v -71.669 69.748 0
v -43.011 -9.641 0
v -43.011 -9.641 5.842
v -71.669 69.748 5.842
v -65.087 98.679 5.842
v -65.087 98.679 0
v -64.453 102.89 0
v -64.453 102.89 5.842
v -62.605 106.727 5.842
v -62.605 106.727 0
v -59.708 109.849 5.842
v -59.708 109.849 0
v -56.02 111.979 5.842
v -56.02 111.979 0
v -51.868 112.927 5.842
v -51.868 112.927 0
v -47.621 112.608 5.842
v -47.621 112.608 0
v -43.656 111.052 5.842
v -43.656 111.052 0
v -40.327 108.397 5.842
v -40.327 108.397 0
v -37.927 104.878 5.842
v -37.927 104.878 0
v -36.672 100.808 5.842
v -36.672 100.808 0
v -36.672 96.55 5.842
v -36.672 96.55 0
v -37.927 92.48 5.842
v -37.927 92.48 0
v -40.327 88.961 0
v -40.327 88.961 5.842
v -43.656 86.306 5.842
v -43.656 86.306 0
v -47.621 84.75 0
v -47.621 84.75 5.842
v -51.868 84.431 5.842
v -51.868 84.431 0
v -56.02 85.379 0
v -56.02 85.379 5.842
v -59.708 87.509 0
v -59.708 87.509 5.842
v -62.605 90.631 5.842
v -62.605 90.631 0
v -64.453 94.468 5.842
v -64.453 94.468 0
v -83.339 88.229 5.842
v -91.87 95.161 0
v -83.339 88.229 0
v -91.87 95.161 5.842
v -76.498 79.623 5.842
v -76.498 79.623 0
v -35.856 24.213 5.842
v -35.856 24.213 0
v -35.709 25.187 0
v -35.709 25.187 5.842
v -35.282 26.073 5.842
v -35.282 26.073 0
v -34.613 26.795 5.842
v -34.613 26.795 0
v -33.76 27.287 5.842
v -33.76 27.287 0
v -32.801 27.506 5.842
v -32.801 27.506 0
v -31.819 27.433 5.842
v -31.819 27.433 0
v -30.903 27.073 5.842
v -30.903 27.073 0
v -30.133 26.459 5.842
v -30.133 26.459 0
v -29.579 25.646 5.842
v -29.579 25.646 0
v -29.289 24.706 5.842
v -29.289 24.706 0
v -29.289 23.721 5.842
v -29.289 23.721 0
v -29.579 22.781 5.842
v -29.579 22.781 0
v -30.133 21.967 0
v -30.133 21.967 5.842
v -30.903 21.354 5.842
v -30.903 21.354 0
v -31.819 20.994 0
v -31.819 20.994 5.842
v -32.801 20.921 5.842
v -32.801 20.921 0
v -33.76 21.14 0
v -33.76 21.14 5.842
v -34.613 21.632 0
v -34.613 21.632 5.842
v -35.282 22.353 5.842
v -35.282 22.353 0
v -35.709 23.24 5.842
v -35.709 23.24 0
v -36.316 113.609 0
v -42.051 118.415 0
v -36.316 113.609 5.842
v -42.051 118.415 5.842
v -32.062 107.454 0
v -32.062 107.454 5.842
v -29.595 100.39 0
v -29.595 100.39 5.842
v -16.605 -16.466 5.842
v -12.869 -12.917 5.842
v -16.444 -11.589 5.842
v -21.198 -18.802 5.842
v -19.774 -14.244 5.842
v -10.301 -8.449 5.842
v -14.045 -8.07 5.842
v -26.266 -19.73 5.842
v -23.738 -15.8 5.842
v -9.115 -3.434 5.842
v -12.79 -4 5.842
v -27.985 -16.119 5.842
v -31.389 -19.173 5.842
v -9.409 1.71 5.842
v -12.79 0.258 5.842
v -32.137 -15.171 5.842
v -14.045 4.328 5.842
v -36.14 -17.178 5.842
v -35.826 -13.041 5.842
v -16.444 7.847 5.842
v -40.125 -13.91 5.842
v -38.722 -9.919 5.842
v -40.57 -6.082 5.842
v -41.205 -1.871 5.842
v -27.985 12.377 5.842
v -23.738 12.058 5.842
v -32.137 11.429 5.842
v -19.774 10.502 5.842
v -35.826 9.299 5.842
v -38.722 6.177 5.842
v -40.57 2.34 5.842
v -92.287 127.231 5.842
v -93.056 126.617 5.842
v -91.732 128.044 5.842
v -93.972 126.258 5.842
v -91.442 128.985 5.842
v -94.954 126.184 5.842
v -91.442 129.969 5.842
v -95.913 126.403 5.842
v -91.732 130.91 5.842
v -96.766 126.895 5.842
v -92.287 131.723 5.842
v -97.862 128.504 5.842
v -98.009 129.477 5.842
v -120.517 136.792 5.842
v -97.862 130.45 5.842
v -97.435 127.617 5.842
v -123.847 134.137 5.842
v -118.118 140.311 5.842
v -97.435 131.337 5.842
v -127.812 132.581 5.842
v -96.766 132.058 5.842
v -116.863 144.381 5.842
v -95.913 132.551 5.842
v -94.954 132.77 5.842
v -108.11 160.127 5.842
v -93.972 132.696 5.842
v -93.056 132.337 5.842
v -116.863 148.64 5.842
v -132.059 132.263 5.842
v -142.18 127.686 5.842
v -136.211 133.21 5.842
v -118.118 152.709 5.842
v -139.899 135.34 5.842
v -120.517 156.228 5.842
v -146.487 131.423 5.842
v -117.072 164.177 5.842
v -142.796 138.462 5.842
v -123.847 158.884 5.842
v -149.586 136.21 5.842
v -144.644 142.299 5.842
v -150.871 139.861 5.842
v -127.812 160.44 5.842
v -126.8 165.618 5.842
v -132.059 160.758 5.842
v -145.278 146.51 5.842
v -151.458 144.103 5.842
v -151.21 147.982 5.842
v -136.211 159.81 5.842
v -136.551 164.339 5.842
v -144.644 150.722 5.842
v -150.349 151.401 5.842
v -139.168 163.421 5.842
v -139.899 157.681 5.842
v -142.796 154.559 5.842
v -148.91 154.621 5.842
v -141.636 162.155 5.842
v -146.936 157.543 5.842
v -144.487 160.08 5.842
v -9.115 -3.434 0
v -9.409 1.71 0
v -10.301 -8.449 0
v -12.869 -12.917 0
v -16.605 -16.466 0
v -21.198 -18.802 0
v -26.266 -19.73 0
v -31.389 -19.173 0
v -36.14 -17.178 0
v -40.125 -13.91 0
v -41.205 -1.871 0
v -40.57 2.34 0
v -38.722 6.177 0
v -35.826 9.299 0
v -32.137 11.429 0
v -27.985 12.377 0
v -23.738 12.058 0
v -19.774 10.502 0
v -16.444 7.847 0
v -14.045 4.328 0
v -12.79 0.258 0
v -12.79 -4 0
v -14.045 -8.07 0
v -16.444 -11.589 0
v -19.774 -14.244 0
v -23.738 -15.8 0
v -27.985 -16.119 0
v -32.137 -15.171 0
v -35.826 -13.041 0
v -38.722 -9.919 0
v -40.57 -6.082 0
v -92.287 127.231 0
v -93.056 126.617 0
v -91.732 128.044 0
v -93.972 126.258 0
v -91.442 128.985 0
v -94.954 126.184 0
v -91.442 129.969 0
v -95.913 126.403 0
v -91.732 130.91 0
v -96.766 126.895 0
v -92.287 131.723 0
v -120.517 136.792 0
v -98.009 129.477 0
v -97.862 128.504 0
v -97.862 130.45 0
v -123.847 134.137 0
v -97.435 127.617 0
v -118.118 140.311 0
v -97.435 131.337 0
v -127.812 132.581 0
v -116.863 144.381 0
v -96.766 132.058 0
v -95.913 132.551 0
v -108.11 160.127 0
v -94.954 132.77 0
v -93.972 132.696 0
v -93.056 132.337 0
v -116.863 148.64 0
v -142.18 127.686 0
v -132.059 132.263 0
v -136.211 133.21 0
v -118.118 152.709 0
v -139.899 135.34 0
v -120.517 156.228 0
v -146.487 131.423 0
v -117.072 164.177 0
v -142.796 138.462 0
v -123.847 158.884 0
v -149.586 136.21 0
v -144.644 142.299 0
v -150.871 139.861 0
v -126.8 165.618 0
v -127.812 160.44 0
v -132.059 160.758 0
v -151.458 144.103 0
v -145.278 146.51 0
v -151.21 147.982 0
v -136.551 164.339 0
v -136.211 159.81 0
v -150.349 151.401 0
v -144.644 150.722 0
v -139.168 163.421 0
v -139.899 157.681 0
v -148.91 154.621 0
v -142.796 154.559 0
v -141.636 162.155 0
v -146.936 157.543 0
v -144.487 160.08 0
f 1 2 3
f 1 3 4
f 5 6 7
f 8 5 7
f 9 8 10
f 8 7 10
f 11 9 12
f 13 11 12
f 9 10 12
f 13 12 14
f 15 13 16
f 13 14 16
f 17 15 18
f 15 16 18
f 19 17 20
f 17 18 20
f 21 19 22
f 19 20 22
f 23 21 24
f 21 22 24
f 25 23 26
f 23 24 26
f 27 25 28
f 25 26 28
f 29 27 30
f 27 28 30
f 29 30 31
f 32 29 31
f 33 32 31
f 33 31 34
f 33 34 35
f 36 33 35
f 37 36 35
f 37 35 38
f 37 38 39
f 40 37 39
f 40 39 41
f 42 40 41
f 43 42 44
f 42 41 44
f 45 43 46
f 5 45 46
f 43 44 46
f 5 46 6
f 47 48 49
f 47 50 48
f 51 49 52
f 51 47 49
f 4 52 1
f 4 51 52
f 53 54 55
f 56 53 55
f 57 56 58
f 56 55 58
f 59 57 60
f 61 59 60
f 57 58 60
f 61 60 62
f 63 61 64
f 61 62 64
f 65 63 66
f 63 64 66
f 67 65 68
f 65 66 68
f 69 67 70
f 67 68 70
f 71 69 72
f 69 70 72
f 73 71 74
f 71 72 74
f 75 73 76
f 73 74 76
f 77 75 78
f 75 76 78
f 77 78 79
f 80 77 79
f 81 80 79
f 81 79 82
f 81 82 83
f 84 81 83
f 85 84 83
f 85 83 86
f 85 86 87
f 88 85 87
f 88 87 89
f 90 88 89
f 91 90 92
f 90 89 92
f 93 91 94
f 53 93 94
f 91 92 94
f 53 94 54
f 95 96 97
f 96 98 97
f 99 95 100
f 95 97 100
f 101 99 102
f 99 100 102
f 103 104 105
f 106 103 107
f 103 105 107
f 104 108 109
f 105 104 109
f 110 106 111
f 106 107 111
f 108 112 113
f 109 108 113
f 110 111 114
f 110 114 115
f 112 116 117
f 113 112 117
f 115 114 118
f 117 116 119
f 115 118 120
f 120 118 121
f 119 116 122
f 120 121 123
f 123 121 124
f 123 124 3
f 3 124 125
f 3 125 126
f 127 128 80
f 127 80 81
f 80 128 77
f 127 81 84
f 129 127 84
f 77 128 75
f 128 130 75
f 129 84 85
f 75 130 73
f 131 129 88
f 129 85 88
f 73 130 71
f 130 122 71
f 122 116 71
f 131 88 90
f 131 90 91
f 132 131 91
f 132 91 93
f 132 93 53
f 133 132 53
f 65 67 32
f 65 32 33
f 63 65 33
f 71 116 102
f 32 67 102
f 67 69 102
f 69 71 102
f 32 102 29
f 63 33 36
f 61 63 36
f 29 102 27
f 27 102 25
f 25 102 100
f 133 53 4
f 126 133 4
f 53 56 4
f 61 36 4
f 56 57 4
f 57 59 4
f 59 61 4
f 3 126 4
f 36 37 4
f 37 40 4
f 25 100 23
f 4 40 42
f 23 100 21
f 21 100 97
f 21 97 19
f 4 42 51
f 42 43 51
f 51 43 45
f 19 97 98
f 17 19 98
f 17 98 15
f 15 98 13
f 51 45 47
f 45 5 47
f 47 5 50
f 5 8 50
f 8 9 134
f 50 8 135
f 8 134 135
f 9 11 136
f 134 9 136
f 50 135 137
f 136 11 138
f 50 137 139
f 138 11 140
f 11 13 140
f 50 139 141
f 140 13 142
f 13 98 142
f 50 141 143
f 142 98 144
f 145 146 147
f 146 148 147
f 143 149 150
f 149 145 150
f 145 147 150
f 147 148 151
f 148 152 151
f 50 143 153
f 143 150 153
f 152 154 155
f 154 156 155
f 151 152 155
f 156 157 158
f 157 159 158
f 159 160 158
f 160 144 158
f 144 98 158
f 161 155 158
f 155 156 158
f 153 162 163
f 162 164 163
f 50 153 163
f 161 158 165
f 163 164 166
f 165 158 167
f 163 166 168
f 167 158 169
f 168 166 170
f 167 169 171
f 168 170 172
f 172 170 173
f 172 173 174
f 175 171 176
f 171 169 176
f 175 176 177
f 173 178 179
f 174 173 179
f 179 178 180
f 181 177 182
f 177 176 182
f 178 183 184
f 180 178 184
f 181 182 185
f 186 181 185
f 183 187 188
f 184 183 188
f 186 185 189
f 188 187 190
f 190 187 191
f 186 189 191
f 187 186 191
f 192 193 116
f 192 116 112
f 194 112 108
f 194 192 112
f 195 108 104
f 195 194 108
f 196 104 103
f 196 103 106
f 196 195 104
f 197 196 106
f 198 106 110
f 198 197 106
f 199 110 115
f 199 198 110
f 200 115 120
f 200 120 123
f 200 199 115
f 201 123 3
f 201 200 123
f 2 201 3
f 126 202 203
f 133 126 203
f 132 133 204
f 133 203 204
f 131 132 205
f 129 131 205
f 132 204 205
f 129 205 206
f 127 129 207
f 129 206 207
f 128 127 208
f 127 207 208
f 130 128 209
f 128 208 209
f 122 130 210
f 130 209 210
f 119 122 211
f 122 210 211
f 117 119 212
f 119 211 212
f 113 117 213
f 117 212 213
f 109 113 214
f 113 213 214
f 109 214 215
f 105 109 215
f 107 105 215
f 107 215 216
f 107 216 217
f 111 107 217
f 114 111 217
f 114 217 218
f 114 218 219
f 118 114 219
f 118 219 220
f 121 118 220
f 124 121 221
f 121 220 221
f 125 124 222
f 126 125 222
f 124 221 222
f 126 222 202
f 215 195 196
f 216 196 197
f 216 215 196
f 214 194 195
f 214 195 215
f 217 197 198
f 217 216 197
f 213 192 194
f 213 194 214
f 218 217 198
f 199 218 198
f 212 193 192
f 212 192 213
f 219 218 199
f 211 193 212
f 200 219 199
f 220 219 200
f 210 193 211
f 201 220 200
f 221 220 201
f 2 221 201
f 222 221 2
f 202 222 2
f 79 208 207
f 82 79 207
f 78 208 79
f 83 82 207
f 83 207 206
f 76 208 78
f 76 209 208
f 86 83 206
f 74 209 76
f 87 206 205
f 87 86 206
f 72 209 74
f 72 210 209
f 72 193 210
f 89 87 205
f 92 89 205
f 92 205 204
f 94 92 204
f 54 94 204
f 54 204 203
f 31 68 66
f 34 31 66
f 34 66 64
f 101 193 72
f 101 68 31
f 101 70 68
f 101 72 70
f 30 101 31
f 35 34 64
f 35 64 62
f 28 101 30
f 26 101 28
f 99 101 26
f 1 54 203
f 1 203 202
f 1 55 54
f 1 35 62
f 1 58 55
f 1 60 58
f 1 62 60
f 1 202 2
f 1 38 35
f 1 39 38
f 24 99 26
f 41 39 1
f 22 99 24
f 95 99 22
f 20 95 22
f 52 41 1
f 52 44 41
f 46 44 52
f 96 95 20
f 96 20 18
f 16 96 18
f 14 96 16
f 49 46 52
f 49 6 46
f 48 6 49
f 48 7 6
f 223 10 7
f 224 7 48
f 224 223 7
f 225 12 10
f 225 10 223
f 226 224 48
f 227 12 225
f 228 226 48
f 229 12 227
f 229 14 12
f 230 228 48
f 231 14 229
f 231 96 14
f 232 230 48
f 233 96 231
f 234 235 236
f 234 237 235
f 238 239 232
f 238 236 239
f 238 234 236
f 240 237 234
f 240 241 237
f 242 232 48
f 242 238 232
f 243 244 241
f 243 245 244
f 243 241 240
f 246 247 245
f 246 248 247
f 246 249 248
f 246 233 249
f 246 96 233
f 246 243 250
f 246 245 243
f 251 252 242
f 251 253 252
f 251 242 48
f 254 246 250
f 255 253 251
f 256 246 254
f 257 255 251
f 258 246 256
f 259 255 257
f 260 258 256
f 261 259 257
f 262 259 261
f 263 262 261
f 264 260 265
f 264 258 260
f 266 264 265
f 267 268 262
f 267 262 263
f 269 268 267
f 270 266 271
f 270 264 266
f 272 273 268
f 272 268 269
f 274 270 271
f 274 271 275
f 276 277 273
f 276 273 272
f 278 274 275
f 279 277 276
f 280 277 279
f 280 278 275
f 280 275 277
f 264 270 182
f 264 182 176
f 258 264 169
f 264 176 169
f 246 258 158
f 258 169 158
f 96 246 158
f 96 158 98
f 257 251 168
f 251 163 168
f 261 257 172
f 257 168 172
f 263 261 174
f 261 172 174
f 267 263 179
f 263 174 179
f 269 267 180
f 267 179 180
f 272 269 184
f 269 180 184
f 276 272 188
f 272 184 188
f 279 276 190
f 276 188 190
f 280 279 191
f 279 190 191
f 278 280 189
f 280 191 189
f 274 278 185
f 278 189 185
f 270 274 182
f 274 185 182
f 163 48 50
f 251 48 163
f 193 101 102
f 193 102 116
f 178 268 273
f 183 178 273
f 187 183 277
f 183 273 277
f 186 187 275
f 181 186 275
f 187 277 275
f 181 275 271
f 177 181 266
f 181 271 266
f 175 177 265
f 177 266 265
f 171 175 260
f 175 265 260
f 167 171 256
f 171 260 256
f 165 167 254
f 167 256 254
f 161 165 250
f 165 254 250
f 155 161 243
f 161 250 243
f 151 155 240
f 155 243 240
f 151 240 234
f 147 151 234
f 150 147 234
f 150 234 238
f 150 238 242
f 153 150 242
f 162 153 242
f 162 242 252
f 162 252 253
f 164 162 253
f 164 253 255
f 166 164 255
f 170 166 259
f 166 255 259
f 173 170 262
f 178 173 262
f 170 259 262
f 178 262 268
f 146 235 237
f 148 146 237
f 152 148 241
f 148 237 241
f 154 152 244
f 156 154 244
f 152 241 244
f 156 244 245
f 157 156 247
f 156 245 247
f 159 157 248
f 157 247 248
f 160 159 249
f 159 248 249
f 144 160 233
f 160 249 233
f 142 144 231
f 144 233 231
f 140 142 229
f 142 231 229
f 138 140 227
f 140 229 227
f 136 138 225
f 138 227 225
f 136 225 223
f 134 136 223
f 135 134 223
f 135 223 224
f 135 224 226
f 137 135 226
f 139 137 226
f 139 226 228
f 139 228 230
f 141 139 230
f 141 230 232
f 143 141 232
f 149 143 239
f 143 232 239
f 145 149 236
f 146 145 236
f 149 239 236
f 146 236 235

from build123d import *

# Parameters (mm, degrees)
SKETCH1_R           = 14.2875
SKETCH1_R_2         = 3.302
BOSS_EXTRUDE1_DEPTH = 5.842
FILLET6_R           = 35.56
FILLET10_R          = 27.94
FILLET13_R          = 50.8
FILLET16_R          = 20.32


with BuildPart() as part:
    # Sketch1 → Boss-Extrude1 (new body)
    with BuildSketch(Plane(origin=(0, 0, 0), x_dir=(-1, 0, 0), z_dir=(0, 0, -1))):
        with BuildLine():
            Line((165.785053206, 142.946766421), (130.990896358, 174.574150067))
            Line((130.990896358, 174.574150067), (31.981087973, 112.057039535))
            Line((31.981087973, 112.057039535), (9.409224511, 1.710371233))
            ThreePointArc((9.409224511, 1.710371233), (21.197749586, -18.801775256), (43.01064713, -9.641263383))
            Line((43.01064713, -9.641263383), (77.484953862, 85.860414024))
            Line((77.484953862, 85.860414024), (165.785053206, 142.946766421))
        make_face()
        with Locations((130.990896358, 146.510317071)):
            Circle(SKETCH1_R, mode=Mode.SUBTRACT)
        with Locations((32.554001794, 24.213373462)):
            Circle(SKETCH1_R_2, mode=Mode.SUBTRACT)
        with Locations((94.707078764, 129.476886965)):
            Circle(SKETCH1_R_2, mode=Mode.SUBTRACT)
        with Locations((50.8, 98.679)):
            Circle(SKETCH1_R, mode=Mode.SUBTRACT)
        with Locations((26.917500437, -1.871018398)):
            Circle(SKETCH1_R, mode=Mode.SUBTRACT)
    extrude(amount=-BOSS_EXTRUDE1_DEPTH)

    # Fillet6
    fillet6_edges = [part.edges().sort_by_distance(p)[0] for p in [
        (-130.990896358, 174.574150067, 2.921),
    ]]
    fillet(fillet6_edges, radius=FILLET6_R)

    # Fillet10
    fillet10_edges = [part.edges().sort_by_distance(p)[0] for p in [
        (-31.981087973, 112.057039535, 2.921),
    ]]
    fillet(fillet10_edges, radius=FILLET10_R)

    # Fillet13
    fillet13_edges = [part.edges().sort_by_distance(p)[0] for p in [
        (-77.484953862, 85.860414024, 2.921),
    ]]
    fillet(fillet13_edges, radius=FILLET13_R)

    # Fillet16
    fillet16_edges = [part.edges().sort_by_distance(p)[0] for p in [
        (-165.785053206, 142.946766421, 2.921),
    ]]
    fillet(fillet16_edges, radius=FILLET16_R)


solid = part.part
